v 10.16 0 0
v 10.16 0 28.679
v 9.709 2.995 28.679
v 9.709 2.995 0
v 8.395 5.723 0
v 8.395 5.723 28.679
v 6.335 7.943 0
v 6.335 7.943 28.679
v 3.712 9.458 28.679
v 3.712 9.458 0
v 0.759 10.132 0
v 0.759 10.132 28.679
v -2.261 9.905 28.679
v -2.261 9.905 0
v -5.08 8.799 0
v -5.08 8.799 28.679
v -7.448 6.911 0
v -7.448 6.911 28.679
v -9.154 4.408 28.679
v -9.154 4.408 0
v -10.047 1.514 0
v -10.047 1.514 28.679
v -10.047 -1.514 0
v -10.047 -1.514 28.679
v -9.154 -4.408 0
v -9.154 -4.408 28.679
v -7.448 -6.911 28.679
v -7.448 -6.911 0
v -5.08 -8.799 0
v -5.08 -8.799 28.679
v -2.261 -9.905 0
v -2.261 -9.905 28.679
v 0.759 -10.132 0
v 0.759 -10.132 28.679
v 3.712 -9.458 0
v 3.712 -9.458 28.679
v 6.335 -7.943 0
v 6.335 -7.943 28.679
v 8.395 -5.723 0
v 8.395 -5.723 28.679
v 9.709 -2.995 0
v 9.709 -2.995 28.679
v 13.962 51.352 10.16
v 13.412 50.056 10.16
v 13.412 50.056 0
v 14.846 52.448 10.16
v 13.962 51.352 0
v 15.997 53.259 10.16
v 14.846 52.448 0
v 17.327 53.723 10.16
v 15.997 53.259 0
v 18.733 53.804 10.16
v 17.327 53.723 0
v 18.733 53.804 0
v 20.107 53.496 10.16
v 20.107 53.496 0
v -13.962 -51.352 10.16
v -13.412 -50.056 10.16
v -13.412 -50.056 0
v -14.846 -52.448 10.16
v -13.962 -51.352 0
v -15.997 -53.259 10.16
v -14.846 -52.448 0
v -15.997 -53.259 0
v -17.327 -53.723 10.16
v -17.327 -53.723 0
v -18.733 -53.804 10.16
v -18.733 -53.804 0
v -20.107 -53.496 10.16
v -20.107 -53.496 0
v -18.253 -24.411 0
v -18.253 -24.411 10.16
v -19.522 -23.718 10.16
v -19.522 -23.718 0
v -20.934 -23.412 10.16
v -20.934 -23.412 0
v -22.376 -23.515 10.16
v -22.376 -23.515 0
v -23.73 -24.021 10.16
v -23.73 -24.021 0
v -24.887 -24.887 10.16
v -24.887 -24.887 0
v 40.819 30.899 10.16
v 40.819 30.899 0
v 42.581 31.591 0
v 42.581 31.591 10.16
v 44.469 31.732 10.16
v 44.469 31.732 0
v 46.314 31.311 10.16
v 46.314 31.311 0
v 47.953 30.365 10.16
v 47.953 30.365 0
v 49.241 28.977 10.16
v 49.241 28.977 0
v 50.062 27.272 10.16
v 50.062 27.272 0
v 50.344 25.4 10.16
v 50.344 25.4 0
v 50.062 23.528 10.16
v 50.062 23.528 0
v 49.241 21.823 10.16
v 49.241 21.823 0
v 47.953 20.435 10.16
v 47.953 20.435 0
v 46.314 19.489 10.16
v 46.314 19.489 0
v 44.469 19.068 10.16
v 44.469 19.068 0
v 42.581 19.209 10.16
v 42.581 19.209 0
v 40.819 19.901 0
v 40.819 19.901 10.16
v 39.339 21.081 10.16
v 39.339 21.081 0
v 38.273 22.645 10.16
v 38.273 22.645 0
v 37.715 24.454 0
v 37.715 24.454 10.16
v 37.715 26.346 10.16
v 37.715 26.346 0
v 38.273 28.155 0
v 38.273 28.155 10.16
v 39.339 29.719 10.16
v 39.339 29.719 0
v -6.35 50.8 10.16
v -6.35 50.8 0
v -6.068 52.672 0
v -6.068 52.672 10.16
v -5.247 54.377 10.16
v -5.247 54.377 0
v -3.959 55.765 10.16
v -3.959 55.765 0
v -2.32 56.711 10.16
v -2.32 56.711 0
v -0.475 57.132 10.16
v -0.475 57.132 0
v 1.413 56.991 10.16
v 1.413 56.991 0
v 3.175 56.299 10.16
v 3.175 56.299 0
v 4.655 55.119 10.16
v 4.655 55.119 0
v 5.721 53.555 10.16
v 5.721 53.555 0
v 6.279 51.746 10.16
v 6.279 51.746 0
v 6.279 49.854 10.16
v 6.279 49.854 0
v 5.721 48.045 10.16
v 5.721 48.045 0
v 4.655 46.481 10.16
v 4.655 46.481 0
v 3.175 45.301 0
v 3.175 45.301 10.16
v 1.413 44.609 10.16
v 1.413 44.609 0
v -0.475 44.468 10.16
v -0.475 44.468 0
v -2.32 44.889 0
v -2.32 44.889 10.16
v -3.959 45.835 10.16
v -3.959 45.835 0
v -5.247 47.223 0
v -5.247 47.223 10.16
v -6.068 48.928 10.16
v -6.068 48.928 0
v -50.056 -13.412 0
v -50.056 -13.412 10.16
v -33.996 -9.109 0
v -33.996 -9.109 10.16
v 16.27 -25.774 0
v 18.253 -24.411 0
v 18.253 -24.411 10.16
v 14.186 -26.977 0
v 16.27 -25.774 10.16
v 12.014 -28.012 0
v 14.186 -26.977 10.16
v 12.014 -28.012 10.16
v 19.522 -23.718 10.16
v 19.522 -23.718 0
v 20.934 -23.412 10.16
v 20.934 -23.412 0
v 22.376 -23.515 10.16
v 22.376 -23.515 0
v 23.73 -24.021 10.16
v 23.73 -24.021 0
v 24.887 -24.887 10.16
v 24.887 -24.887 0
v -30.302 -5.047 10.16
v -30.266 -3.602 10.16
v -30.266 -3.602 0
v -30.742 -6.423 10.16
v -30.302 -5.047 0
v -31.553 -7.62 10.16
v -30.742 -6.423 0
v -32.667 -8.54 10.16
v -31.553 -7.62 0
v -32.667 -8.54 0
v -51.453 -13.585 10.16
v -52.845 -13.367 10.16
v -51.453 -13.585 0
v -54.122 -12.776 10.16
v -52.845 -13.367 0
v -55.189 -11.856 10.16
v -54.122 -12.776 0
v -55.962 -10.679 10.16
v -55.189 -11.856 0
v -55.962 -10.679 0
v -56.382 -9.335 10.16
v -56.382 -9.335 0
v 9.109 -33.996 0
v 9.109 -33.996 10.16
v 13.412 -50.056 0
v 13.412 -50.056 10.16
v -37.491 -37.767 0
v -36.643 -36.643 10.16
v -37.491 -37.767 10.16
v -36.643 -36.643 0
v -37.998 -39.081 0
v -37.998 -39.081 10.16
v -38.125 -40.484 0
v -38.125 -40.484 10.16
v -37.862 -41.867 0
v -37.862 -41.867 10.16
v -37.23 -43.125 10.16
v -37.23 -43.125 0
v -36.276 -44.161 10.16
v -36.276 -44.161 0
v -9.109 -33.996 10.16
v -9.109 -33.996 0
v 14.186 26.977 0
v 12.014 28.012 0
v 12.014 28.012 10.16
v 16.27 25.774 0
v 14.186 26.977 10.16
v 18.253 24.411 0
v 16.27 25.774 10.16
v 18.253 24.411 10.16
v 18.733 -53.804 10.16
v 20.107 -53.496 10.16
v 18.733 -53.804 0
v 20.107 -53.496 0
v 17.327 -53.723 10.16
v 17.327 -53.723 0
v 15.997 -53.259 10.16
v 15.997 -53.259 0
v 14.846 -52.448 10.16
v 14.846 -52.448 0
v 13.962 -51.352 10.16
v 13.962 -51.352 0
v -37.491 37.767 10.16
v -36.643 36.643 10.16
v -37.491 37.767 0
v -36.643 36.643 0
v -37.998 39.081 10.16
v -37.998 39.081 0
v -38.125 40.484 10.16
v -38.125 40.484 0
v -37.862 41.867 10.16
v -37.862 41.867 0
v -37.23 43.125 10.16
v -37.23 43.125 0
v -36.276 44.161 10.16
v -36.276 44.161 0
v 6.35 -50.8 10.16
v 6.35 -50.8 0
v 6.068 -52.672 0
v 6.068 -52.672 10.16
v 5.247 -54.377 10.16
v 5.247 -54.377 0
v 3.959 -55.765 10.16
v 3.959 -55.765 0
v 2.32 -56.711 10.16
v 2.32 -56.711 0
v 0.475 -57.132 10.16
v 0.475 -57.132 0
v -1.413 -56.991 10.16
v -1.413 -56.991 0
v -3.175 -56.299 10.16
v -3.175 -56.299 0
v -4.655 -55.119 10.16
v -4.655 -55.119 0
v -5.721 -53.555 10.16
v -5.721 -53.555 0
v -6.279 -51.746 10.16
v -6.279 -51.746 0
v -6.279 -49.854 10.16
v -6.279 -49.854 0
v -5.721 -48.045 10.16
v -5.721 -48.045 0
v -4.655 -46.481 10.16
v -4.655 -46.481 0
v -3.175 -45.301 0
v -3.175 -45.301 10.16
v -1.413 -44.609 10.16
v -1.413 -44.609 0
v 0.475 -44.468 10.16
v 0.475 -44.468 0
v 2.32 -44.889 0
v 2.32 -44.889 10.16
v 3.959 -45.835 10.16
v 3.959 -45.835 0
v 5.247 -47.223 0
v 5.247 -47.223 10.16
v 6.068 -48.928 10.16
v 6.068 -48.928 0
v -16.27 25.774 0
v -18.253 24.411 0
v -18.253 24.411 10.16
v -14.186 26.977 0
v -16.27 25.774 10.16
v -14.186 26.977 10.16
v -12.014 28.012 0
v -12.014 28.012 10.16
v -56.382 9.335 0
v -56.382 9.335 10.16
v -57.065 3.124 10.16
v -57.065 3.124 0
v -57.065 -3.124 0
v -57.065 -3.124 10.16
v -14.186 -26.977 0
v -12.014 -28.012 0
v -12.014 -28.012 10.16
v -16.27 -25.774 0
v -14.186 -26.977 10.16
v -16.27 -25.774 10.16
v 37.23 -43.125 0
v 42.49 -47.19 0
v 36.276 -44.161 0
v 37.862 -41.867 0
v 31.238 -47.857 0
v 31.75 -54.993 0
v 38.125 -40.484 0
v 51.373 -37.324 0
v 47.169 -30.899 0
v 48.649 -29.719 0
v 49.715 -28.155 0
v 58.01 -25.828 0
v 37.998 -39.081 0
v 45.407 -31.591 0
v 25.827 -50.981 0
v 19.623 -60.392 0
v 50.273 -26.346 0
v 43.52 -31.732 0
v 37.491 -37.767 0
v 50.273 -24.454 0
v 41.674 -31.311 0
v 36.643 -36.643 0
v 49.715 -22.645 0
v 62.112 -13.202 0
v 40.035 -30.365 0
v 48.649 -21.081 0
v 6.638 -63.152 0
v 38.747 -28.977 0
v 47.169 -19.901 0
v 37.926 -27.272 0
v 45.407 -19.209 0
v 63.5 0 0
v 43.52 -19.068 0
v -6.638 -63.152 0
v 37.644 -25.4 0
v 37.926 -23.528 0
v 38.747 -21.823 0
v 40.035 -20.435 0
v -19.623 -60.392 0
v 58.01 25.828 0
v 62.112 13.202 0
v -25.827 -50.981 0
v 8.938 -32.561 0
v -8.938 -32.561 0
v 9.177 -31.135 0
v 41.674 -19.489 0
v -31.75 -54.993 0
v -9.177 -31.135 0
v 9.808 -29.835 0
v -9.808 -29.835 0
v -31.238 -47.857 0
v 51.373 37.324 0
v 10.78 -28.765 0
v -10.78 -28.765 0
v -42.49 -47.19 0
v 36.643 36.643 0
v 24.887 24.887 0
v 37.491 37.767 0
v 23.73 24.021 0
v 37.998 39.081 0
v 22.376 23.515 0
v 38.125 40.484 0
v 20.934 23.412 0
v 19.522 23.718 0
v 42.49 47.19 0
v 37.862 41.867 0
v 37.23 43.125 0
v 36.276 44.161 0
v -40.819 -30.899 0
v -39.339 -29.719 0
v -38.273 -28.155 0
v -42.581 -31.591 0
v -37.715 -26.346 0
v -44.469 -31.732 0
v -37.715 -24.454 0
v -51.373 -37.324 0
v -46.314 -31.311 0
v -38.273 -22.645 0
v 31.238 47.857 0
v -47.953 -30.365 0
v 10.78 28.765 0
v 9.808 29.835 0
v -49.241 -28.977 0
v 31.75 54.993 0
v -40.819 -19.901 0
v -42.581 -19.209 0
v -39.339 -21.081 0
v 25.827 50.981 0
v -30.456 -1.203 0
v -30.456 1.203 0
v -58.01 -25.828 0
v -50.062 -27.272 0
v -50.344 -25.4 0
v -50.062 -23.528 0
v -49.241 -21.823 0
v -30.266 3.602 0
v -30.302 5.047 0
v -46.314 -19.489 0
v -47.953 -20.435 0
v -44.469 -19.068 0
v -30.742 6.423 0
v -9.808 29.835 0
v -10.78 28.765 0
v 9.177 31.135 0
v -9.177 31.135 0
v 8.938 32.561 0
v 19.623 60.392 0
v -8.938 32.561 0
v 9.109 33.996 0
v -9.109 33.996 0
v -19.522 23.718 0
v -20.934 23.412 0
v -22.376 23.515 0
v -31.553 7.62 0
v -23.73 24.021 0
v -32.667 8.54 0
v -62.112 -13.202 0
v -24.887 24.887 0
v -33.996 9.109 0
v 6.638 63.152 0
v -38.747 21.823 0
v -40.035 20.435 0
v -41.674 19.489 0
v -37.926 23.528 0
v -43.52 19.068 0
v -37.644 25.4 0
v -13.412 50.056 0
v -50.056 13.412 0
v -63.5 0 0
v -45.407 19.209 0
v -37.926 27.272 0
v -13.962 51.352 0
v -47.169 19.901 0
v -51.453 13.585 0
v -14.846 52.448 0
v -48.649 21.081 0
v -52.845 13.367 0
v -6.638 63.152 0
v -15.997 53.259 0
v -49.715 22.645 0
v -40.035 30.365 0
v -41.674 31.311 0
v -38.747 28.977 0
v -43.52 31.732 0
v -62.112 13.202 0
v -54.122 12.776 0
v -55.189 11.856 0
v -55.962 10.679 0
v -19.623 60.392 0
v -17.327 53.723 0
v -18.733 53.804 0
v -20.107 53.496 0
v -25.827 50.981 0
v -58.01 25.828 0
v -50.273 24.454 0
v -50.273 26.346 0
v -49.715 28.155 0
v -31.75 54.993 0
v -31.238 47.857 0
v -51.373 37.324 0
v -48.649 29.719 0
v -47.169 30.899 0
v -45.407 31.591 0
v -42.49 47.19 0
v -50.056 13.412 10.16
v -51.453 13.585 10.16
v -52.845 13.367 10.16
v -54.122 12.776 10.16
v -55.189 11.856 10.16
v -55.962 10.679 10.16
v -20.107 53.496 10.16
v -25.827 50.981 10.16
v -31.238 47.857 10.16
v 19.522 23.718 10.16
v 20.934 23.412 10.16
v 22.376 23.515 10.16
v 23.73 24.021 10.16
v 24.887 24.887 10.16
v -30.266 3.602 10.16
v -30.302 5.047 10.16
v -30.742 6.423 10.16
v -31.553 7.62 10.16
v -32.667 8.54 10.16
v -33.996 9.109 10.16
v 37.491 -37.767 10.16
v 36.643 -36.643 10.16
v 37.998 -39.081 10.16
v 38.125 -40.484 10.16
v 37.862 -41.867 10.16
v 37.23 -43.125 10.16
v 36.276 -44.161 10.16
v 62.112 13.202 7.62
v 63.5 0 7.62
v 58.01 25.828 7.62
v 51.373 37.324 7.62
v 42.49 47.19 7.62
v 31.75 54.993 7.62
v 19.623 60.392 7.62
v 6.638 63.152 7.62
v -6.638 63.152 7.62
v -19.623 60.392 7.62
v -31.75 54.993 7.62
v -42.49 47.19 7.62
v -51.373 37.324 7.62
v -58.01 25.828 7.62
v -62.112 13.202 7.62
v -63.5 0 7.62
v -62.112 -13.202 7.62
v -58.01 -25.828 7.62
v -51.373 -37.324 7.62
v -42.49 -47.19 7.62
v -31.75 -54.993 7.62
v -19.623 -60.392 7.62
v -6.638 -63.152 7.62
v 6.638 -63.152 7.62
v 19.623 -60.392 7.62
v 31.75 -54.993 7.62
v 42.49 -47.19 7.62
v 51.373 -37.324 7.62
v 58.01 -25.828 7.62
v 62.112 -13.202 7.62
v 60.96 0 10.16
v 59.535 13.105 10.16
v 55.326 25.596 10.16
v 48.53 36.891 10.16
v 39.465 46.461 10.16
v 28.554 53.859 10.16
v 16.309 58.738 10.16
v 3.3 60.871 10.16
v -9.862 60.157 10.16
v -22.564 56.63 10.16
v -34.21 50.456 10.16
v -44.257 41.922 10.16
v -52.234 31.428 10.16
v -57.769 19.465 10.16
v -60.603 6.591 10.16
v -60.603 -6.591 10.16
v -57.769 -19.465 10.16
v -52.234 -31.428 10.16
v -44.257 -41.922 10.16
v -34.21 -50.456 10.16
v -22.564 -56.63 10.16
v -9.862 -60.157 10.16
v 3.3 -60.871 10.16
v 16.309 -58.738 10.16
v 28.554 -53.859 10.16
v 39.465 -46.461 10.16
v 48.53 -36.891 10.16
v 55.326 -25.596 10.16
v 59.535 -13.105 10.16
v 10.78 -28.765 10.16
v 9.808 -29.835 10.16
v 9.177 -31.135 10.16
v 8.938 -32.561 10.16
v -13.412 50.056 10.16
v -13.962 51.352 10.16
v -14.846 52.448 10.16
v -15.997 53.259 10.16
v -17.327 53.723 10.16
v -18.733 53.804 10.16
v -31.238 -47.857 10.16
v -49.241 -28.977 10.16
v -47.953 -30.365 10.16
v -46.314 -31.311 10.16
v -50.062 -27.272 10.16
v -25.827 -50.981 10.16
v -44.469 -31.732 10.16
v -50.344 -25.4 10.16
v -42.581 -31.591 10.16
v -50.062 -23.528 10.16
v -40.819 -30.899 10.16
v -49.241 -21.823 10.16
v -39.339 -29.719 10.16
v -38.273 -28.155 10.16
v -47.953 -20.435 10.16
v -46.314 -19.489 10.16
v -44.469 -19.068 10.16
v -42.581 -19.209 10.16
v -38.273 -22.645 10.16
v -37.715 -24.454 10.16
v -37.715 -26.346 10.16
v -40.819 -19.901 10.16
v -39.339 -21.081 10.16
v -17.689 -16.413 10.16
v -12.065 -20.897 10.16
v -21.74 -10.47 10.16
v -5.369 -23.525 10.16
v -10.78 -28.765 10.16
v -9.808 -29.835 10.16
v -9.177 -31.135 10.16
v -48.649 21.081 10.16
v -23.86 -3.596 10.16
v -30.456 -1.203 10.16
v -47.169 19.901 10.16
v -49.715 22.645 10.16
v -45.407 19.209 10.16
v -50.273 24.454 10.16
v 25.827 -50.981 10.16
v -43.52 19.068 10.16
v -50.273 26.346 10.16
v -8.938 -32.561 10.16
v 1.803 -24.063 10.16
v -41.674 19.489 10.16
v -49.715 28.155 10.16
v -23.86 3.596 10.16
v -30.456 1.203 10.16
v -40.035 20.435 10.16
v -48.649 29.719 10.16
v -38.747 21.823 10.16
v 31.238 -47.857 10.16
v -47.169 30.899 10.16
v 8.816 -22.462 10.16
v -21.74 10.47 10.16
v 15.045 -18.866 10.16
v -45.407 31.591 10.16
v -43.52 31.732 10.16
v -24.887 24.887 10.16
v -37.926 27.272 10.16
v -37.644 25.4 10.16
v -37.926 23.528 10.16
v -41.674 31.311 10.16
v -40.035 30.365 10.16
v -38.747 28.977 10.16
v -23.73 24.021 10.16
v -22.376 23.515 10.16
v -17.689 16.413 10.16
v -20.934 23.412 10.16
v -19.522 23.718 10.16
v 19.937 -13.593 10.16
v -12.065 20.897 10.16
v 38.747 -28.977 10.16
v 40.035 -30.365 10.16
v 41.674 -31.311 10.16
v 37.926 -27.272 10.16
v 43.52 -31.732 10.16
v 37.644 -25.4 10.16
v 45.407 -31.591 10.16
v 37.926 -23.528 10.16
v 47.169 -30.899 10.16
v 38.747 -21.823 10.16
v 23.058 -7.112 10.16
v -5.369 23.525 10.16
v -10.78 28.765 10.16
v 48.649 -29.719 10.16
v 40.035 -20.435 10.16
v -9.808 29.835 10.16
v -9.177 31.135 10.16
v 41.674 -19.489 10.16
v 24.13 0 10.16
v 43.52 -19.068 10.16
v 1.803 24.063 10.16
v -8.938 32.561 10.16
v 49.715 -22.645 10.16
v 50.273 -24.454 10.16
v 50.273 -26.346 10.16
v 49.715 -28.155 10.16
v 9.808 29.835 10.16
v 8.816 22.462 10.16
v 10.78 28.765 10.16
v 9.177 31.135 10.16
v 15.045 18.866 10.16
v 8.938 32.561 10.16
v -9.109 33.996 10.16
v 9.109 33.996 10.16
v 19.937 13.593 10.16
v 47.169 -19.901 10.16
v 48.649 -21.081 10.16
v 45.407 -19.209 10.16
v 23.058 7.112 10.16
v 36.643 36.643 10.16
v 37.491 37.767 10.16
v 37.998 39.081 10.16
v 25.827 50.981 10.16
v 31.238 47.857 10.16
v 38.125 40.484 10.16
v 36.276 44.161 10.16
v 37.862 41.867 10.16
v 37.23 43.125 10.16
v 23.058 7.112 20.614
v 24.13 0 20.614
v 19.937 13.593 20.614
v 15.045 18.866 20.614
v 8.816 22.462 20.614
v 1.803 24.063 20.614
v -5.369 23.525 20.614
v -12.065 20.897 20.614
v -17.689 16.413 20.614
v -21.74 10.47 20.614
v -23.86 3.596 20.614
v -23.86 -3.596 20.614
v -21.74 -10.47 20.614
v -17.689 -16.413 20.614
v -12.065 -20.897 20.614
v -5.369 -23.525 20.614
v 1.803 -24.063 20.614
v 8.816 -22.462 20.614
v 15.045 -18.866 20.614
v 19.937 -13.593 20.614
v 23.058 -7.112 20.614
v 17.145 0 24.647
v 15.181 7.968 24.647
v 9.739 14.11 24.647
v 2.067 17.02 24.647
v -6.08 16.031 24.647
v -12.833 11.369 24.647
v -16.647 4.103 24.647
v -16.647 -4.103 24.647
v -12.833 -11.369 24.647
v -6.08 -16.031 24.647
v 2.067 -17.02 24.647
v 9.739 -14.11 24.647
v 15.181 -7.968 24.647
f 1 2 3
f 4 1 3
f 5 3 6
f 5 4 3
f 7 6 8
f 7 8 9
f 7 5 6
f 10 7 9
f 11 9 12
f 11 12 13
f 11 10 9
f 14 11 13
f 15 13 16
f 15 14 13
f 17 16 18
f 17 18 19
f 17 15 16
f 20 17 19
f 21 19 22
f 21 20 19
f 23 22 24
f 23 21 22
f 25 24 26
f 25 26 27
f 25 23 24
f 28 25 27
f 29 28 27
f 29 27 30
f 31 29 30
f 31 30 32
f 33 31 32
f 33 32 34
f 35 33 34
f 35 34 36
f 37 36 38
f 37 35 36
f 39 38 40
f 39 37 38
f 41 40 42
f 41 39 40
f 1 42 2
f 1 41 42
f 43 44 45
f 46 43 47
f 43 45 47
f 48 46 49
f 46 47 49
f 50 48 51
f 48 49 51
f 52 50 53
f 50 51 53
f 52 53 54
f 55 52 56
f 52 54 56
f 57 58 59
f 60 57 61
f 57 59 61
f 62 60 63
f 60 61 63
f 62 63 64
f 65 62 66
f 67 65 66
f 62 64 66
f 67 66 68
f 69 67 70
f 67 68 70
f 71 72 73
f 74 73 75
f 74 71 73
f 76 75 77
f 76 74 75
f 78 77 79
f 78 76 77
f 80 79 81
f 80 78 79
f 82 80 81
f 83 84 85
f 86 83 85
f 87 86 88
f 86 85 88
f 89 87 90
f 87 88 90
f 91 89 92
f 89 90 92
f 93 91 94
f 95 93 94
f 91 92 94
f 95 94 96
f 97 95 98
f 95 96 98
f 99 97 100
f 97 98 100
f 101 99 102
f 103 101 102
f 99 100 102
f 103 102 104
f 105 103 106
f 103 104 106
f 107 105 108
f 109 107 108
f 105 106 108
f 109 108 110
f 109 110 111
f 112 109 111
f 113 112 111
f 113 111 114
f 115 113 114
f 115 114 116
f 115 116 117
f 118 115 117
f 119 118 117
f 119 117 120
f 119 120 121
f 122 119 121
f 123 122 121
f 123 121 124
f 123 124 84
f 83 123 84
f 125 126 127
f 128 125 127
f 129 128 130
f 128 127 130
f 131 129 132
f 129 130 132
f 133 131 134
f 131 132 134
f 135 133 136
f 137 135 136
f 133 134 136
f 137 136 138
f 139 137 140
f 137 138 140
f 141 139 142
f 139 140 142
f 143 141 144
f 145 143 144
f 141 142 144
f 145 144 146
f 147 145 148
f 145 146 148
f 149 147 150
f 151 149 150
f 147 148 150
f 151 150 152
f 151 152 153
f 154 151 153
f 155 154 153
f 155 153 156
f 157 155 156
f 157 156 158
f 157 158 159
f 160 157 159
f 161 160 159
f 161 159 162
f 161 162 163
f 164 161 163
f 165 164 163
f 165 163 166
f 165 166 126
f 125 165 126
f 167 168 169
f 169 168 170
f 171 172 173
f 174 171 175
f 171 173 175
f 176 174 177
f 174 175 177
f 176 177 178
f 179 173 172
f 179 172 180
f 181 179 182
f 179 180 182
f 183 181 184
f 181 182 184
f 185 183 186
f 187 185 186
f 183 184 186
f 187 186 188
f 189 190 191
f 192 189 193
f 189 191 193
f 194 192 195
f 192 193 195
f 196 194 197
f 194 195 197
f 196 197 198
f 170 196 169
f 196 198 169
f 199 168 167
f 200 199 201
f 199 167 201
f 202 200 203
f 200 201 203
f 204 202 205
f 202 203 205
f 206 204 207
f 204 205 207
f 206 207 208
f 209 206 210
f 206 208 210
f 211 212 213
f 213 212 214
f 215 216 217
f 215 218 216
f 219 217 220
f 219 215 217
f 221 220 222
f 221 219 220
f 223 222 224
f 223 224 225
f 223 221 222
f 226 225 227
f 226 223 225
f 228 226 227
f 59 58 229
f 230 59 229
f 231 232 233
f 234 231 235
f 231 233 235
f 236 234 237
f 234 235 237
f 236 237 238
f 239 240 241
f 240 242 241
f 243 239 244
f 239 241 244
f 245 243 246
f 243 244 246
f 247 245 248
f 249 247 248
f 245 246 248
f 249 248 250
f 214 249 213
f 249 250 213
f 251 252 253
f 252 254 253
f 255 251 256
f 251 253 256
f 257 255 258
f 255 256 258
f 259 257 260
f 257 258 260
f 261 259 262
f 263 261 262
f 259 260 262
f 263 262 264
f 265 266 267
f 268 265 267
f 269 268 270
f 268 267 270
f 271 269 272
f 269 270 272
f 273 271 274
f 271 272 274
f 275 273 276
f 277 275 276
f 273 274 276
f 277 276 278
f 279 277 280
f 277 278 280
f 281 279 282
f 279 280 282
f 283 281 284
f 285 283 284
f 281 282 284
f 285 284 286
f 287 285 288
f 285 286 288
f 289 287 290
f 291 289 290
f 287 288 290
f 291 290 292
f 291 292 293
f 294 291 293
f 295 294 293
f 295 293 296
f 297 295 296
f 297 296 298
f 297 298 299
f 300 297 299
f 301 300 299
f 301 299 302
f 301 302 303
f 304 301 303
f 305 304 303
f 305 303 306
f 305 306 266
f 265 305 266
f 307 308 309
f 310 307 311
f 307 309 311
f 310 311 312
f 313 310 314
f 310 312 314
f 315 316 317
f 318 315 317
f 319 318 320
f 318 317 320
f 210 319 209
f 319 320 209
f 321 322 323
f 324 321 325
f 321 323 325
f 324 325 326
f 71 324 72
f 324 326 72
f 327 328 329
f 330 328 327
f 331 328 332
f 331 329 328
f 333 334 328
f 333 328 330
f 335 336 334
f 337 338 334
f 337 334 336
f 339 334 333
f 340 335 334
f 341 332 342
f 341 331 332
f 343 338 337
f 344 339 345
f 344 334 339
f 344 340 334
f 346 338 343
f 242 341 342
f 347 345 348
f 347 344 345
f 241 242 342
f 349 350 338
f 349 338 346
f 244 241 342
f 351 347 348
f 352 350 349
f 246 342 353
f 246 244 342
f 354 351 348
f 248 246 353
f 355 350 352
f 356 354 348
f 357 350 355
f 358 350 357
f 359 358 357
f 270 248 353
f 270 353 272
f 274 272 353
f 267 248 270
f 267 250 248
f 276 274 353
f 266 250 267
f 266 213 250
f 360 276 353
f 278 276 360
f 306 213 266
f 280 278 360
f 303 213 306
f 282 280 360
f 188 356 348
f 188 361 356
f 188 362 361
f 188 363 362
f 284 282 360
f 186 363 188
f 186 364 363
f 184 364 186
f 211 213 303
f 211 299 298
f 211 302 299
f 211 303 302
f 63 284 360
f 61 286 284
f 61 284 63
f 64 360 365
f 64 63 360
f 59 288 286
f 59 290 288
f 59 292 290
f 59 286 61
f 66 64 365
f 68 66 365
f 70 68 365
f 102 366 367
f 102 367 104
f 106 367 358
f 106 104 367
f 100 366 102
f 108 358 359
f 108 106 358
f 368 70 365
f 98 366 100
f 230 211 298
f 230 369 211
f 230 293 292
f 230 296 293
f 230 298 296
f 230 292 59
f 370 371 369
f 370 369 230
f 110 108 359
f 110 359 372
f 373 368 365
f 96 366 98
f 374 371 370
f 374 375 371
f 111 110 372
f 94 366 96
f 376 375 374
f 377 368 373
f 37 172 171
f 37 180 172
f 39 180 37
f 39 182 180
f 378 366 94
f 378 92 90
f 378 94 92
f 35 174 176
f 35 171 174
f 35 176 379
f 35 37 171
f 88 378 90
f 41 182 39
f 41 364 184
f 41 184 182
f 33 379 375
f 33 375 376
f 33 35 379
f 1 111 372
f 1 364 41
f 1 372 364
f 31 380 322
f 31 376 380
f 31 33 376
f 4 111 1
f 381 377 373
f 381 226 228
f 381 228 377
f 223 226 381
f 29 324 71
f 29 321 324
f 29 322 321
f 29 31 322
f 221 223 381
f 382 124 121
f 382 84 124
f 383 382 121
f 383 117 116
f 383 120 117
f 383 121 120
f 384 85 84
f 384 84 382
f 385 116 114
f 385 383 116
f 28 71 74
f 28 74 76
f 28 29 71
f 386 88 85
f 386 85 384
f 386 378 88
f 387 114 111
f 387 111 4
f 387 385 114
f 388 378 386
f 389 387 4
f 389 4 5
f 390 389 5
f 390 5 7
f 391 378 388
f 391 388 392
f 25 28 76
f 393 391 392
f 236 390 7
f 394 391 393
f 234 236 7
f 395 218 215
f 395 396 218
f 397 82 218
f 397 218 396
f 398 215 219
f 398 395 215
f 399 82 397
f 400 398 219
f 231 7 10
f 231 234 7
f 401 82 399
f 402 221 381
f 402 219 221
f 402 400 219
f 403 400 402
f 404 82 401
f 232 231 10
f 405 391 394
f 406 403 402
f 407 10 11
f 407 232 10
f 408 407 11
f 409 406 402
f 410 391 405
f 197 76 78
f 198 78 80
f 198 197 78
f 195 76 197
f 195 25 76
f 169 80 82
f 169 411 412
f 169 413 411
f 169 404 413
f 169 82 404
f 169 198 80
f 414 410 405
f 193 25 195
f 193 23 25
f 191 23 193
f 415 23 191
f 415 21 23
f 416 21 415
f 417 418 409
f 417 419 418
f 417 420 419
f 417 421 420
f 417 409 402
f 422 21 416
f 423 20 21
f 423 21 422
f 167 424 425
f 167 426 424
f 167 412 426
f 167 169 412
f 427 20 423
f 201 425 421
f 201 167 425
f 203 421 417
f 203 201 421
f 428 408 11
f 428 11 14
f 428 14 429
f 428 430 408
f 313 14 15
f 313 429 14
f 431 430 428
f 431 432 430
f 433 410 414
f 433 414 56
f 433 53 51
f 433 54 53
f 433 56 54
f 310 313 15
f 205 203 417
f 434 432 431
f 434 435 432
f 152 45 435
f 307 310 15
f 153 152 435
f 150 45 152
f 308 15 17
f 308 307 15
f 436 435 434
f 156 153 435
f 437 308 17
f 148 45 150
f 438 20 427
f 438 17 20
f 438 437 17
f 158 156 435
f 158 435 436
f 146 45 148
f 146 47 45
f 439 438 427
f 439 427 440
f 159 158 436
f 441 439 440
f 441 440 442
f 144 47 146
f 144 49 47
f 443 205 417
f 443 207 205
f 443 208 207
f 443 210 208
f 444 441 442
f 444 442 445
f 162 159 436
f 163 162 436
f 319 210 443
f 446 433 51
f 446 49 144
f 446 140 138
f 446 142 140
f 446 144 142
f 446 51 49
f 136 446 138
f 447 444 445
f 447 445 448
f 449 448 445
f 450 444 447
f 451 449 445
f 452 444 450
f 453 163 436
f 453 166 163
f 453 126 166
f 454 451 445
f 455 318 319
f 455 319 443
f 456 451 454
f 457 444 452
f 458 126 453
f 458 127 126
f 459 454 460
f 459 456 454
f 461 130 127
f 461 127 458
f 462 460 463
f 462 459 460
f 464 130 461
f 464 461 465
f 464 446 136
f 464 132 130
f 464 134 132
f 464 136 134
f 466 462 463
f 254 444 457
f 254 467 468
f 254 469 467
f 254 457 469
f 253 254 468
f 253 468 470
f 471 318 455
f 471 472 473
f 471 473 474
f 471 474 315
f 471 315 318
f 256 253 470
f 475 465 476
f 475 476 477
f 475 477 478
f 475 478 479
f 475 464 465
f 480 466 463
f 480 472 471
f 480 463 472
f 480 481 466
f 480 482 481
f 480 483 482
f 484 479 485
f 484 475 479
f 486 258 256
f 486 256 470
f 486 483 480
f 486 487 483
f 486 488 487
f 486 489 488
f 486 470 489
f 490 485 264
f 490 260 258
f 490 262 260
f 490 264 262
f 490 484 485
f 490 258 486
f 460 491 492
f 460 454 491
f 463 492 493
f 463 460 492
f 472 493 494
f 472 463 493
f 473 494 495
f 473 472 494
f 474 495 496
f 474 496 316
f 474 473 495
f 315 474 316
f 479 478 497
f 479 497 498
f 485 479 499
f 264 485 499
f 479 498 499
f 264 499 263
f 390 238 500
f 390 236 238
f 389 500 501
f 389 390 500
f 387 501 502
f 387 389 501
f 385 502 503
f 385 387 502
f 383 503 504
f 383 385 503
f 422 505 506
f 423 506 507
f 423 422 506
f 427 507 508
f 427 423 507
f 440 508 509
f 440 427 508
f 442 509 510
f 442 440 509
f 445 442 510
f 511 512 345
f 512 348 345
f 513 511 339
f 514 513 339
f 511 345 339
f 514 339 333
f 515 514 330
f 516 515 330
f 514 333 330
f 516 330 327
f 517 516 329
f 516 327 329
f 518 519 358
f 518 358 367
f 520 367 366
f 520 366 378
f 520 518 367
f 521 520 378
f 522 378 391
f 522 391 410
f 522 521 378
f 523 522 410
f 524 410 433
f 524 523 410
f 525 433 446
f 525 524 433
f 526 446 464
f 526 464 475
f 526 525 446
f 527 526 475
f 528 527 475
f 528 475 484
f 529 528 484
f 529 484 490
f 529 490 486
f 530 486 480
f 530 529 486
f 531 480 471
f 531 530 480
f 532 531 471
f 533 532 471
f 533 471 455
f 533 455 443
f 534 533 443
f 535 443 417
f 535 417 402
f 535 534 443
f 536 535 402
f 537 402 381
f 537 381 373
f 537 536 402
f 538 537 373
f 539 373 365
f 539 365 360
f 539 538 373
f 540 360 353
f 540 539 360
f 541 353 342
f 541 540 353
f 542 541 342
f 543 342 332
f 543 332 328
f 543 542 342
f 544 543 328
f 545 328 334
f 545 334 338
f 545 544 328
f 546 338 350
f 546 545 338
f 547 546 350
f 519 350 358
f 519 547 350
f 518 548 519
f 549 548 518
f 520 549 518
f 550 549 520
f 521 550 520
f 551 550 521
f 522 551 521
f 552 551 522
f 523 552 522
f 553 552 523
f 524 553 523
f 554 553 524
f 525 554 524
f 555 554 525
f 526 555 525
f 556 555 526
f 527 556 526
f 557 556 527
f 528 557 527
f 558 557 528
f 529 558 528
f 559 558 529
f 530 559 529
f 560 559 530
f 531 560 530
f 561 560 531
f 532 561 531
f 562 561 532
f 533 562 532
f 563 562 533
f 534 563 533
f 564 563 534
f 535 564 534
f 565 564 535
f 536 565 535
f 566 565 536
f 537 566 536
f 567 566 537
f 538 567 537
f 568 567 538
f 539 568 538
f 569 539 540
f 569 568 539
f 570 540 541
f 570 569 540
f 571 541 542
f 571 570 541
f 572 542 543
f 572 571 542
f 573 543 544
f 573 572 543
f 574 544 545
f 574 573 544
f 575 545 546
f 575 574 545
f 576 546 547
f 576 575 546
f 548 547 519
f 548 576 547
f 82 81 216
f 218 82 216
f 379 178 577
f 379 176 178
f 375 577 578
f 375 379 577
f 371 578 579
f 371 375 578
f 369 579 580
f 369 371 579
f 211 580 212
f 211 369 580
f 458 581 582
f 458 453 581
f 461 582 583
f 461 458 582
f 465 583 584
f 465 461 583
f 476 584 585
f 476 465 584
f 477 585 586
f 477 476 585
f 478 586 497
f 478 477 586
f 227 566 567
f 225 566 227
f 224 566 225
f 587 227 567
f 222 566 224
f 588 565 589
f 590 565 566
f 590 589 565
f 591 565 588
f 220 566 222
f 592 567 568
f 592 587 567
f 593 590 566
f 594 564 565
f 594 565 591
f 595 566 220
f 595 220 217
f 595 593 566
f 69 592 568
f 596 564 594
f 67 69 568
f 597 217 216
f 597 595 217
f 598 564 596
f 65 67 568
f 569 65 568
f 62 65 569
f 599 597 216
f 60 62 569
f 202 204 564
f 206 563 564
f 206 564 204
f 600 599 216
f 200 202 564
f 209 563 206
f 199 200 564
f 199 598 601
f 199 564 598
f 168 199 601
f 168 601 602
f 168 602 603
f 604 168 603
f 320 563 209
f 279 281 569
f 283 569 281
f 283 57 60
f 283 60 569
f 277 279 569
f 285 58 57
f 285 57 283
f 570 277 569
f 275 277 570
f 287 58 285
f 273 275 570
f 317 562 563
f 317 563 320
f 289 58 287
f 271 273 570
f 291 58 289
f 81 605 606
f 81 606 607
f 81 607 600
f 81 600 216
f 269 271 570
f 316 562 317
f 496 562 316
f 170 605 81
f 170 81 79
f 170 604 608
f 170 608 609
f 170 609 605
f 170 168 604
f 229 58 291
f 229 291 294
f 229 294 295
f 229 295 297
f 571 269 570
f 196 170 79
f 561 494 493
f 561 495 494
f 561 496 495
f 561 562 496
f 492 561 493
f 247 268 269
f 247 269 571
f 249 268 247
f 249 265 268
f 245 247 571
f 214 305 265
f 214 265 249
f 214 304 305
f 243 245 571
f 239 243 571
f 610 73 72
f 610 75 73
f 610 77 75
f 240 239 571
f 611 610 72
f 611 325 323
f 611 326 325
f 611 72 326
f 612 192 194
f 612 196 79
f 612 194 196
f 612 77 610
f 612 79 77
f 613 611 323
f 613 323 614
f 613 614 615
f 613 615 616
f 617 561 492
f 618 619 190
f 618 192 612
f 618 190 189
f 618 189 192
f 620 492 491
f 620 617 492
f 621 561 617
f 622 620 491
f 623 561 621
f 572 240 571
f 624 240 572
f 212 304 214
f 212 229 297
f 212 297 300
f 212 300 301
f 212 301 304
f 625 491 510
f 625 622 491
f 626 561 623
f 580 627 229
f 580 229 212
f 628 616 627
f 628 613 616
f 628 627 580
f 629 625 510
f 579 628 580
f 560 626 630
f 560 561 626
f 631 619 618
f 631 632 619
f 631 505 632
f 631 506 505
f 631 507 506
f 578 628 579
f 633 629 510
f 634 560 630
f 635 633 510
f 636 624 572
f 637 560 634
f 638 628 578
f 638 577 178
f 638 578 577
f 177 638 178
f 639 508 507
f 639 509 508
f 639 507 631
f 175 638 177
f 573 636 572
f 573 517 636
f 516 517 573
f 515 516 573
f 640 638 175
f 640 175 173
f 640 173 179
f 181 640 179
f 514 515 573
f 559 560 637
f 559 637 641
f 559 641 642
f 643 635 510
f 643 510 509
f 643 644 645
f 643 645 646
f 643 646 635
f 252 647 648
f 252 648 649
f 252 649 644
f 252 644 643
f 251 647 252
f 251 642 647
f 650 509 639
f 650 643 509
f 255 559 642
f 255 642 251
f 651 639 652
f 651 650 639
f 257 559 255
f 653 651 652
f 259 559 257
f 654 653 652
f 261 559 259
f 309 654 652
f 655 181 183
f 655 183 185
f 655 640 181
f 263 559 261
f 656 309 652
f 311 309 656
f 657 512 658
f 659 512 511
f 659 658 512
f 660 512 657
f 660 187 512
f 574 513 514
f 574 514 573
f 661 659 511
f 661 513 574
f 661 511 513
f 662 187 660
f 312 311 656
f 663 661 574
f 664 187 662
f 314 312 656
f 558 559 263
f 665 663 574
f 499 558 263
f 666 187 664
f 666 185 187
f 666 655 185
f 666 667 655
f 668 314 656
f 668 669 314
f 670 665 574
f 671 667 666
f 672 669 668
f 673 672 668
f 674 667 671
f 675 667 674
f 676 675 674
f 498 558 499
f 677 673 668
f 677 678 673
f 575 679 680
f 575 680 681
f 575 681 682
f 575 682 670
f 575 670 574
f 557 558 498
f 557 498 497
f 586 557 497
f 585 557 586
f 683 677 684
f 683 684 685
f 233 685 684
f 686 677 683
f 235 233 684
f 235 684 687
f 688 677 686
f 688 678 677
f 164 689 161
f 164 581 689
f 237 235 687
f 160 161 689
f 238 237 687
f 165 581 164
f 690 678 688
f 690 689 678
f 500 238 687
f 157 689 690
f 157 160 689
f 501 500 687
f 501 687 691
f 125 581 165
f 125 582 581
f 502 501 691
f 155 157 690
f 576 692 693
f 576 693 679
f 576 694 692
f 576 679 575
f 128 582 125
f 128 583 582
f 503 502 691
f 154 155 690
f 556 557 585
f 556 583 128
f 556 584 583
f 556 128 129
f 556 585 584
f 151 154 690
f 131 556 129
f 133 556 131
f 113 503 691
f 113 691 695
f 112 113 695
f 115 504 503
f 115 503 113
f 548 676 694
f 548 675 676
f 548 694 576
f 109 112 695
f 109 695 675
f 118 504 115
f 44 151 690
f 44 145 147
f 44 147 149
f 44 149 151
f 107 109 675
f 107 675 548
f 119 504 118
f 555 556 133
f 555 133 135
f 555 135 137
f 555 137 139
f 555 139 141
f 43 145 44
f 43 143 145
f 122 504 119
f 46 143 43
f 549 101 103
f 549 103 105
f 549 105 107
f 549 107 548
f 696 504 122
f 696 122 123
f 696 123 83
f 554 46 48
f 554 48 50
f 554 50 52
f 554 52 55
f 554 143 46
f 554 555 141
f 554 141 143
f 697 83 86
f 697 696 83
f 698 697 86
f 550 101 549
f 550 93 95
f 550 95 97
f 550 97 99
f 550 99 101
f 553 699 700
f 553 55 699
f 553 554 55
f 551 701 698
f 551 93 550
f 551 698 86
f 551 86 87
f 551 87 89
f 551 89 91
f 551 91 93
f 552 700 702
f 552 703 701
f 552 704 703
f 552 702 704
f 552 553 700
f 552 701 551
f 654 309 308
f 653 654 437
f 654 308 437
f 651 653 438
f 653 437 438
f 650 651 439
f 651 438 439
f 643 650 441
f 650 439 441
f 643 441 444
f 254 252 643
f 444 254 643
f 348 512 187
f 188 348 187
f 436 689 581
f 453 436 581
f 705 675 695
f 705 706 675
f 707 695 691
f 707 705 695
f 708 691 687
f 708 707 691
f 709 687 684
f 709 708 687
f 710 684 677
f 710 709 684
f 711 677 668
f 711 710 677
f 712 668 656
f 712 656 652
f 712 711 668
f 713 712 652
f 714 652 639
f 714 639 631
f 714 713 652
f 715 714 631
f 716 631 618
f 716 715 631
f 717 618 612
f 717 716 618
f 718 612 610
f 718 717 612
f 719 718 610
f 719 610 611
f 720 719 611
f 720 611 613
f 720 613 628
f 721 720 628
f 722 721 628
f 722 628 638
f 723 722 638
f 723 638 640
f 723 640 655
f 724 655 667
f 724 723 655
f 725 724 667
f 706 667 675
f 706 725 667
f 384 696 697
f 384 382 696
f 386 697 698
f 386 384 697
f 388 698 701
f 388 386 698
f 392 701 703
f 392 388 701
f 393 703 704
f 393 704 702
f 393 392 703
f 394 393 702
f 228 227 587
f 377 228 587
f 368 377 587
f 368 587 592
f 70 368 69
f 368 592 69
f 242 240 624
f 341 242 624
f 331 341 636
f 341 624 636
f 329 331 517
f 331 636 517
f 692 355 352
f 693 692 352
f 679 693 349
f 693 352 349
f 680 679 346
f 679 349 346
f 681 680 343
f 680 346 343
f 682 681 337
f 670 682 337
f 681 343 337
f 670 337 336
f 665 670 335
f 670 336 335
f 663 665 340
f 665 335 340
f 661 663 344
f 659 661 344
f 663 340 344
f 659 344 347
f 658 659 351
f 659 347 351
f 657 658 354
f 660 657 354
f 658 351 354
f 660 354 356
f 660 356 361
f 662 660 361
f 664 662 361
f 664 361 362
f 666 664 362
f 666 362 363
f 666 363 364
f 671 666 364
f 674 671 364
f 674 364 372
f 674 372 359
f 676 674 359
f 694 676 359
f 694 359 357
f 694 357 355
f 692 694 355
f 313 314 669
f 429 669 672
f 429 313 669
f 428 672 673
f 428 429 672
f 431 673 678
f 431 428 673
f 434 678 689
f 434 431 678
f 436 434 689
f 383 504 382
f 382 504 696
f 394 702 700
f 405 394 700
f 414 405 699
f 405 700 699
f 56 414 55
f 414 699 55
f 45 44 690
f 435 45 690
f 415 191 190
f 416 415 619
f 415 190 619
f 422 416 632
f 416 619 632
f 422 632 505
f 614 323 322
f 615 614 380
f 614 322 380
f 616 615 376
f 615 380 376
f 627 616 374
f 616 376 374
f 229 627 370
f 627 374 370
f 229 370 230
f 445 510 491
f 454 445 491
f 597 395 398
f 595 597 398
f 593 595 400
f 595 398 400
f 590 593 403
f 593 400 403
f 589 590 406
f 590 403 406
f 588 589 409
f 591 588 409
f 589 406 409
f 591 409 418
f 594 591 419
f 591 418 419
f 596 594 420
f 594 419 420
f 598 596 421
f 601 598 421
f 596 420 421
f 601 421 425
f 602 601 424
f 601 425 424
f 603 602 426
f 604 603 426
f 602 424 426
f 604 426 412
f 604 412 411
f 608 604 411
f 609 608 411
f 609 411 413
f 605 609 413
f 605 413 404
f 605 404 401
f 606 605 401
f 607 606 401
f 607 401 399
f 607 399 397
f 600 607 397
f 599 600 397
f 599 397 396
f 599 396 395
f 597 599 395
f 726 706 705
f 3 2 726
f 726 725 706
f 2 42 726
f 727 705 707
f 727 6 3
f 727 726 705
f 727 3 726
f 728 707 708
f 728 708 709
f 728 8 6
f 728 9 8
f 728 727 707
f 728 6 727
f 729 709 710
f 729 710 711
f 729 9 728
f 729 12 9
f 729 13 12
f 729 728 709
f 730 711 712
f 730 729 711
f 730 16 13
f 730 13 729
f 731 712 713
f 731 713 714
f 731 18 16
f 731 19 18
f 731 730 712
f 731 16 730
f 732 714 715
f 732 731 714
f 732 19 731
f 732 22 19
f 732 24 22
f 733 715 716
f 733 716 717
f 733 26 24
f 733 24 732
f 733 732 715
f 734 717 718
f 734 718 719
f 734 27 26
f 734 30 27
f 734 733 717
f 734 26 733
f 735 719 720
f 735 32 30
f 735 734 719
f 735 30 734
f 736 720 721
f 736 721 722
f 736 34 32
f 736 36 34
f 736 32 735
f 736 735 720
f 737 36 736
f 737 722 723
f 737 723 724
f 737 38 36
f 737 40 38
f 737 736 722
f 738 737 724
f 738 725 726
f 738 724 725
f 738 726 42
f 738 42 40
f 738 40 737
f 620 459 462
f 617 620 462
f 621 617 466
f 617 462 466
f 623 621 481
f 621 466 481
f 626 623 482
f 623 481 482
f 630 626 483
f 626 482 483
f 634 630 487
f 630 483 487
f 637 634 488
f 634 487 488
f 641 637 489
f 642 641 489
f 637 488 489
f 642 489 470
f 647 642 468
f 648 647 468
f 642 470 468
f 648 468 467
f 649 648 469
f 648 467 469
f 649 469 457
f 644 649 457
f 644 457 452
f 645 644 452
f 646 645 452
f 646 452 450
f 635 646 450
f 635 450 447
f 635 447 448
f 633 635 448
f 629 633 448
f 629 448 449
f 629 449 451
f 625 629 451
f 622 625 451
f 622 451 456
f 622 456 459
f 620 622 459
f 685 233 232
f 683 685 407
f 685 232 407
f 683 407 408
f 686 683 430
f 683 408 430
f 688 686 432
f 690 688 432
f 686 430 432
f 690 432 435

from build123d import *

# Parameters (mm, degrees)
F3_D            = 12.7
F3_COPIES_COUNT = 6
F5_DEPTH        = 10.161
F5_COPIES_COUNT = 5
F5_COPIES_ANGLE = 240
F6_R            = 5.08
F7_SIZE         = 2.54


# Not quite as in the source:
# - a pattern or mirror of a feature is missing from the dataset's text; its kind, count and spacing are read off the source's solid


with BuildPart() as f1:
    # F0 (on Front) → F1 (revolve)
    with BuildSketch(Plane.XZ):
        Polygon((10.16, 0), (63.5, 0), (63.5, 10.16), (24.13, 10.16), (24.13, 20.6138496578), (10.16, 28.6794329184), align=None)
    revolve(axis=Axis((0, 0, 9.6584064886), (0, 0, 1)))

    # F3 (through all)
    with Locations(Plane.XY.offset(10.16)):
        with Locations((0, 50.8)):
            f3 = Hole(F3_D / 2)

    # F3_copies: F3 ×6 about axis
    f3_copies_axis = Axis((0, 0, 0), (0, 0, 1))
    for i in range(1, F3_COPIES_COUNT):
        add(f3.rotate(f3_copies_axis, i * 360 / F3_COPIES_COUNT), mode=Mode.SUBTRACT)

    # F4 (on face) → F5 (cut, through all)
    with BuildSketch(Plane.XY.offset(10.16)):
        with BuildLine():
            ThreePointArc((7.8888044947, 29.4414191853), (15.24, 26.3964543073), (21.5526146906, 21.5526146906))
            Line((21.5526146906, 21.5526146906), (40.4111525448, 40.4111525448))
            ThreePointArc((40.4111525448, 40.4111525448), (28.575, 49.4933518263), (14.7915084276, 55.2026609724))
            Line((14.7915084276, 55.2026609724), (7.8888044947, 29.4414191853))
        make_face()
    f5 = extrude(amount=-F5_DEPTH, mode=Mode.SUBTRACT)

    # F5_copies: F5 ×5 about axis
    f5_copies_axis = Axis((0, 0, 0), (0, 0, 1))
    for i in range(1, F5_COPIES_COUNT):
        add(f5.rotate(f5_copies_axis, i * F5_COPIES_ANGLE / (F5_COPIES_COUNT - 1)), mode=Mode.SUBTRACT)

    # F6
    f6_edges = [f1.edges().sort_by_distance(p)[0] for p in [
        (14.791508, 55.202661, 5.08),
        (7.888804, 29.441419, 5.08),
        (21.552615, 21.552615, 5.08),
        (40.411153, 40.411153, 5.08),
        (14.791508, -55.202661, 5.08),
        (7.888804, -29.441419, 5.08),
        (21.552615, -21.552615, 5.08),
        (40.411153, -40.411153, 5.08),
        (-40.411153, -40.411153, 5.08),
        (-21.552615, -21.552615, 5.08),
        (-14.791508, -55.202661, 5.08),
        (-7.888804, -29.441419, 5.08),
        (-55.202661, 14.791508, 5.08),
        (-29.441419, 7.888804, 5.08),
        (-55.202661, -14.791508, 5.08),
        (-29.441419, -7.888804, 5.08),
        (-14.791508, 55.202661, 5.08),
        (-7.888804, 29.441419, 5.08),
        (-40.411153, 40.411153, 5.08),
        (-21.552615, 21.552615, 5.08),
    ]]
    fillet(f6_edges, radius=F6_R)

    # F7
    f7_edges = [f1.edges().sort_by_distance(p)[0] for p in [
        (-63.5, 0, 10.16),
    ]]
    chamfer(f7_edges, length=F7_SIZE)


solid = f1.part
